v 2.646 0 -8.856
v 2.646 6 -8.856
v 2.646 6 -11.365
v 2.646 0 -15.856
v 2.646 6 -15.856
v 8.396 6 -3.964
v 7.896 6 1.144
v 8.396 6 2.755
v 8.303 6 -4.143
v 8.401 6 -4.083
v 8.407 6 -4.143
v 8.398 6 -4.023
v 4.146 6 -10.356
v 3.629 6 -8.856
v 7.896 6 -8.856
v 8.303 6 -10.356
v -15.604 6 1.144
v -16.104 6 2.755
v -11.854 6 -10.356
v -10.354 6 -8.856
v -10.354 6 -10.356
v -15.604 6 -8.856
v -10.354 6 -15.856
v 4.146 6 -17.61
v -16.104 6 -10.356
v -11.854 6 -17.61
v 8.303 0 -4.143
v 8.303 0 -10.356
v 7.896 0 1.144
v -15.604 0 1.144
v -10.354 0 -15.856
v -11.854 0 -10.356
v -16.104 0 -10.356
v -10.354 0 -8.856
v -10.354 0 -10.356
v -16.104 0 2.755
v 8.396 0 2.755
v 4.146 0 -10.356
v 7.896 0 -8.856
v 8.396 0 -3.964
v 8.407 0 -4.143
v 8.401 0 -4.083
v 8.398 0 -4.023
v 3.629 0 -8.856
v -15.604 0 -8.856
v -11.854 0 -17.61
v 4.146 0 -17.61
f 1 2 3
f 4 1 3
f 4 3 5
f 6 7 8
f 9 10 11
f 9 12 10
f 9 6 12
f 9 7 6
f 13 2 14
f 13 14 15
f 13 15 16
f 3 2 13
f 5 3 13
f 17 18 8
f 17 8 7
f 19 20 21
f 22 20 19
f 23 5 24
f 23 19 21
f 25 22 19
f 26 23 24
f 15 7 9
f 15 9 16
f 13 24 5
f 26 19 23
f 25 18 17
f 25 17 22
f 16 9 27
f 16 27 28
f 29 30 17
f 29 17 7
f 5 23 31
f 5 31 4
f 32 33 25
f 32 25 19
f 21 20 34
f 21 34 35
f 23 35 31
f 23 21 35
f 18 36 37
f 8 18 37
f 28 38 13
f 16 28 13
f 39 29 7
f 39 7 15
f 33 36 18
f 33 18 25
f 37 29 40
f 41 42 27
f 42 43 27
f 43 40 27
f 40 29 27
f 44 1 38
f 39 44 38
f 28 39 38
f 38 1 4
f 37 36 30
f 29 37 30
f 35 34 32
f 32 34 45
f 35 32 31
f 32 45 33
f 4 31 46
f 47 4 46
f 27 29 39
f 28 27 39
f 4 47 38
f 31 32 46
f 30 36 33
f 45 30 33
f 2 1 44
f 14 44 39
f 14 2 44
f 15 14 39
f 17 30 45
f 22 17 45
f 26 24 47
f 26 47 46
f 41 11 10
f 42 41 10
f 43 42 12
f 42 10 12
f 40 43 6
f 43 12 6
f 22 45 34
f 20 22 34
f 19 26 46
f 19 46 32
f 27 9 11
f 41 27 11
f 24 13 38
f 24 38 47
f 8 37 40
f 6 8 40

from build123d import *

# Parameters (mm, degrees)
SKETCH1_W           = 24.5
SKETCH1_H           = 13.110526316
SKETCH1_W_2         = 23.5
SKETCH1_H_2         = 10
BOSS_EXTRUDE1_DEPTH = 6
BOSS_EXTRUDE2_DEPTH = 6
SKETCH3_W           = 13.982681085
SKETCH3_H           = 4.437803864
CUT_EXTRUDE1_DEPTH  = 11
SKETCH4_W           = 0.982681085
SKETCH4_H           = 2.509369157
BOSS_EXTRUDE3_DEPTH = 6
SKETCH5_W           = 4.892282449
SKETCH5_H           = 6
BOSS_EXTRUDE4_DEPTH = 3.3
FILLET1_R           = 1.5
SKETCH6_W           = 3.982650634
SKETCH6_H           = 6.804776745
CUT_EXTRUDE2_DEPTH  = 10


with BuildPart() as part:
    # Sketch1 → Boss-Extrude1 (new body)
    with BuildSketch(Plane(origin=(0, 0, 0), x_dir=(1, 0, 0), z_dir=(0, 1, 0))):
        with Locations((-3.853684211, 3.800526316)):
            Rectangle(SKETCH1_W, SKETCH1_H)
        with Locations((-3.853684211, 3.855789474)):
            Rectangle(SKETCH1_W_2, SKETCH1_H_2, mode=Mode.SUBTRACT)
    extrude(amount=BOSS_EXTRUDE1_DEPTH)

    # Sketch2 → Boss-Extrude2 (add)
    with BuildSketch(Plane(origin=(0, 6, 0), x_dir=(1, 0, 0), z_dir=(0, 1, 0))):
        Polygon((-10.353684211, 10.355789474), (-10.353684211, 15.855789474), (2.646315789, 15.855789474), (2.646315789, 10.355789474), (4.146315789, 10.355789474), (4.146315789, 17.610127639), (-11.853684211, 17.610127639), (-11.853684211, 10.355789474), align=None)
    extrude(amount=-BOSS_EXTRUDE2_DEPTH)

    # Sketch3 → Cut-Extrude1 (cut)
    with BuildSketch(Plane(origin=(0, 6, 0), x_dir=(1, 0, 0), z_dir=(0, 1, 0))):
        with Locations((-3.362343669, 9.146256699)):
            Rectangle(SKETCH3_W, SKETCH3_H)
    extrude(amount=-CUT_EXTRUDE1_DEPTH, mode=Mode.SUBTRACT)

    # Sketch4 → Boss-Extrude3 (add)
    with BuildSketch(Plane(origin=(0, 6, 0), x_dir=(1, 0, 0), z_dir=(0, 1, 0))):
        with Locations((3.137656332, 10.110474052)):
            Rectangle(SKETCH4_W, SKETCH4_H)
    extrude(amount=-BOSS_EXTRUDE3_DEPTH)

    # Sketch5 → Boss-Extrude4 (add)
    with BuildSketch(Plane(origin=(8.396315789, 0, 0), x_dir=(0, 0, -1), z_dir=(1, 0, 0))):
        with Locations((7.90964825, 3)):
            Rectangle(SKETCH5_W, SKETCH5_H)
    extrude(amount=BOSS_EXTRUDE4_DEPTH)

    # Fillet1
    fillet1_edges = [part.edges().sort_by_distance(p)[0] for p in [
        (8.396315789, 3, -5.463507025),
    ]]
    fillet(fillet1_edges, radius=FILLET1_R)

    # Sketch6 → Cut-Extrude2 (cut)
    with BuildSketch(Plane(origin=(0, 6, 0), x_dir=(1, 0, 0), z_dir=(0, 1, 0))):
        with Locations((10.294706848, 7.545396136)):
            Rectangle(SKETCH6_W, SKETCH6_H)
    extrude(amount=-CUT_EXTRUDE2_DEPTH, mode=Mode.SUBTRACT)


solid = part.part
